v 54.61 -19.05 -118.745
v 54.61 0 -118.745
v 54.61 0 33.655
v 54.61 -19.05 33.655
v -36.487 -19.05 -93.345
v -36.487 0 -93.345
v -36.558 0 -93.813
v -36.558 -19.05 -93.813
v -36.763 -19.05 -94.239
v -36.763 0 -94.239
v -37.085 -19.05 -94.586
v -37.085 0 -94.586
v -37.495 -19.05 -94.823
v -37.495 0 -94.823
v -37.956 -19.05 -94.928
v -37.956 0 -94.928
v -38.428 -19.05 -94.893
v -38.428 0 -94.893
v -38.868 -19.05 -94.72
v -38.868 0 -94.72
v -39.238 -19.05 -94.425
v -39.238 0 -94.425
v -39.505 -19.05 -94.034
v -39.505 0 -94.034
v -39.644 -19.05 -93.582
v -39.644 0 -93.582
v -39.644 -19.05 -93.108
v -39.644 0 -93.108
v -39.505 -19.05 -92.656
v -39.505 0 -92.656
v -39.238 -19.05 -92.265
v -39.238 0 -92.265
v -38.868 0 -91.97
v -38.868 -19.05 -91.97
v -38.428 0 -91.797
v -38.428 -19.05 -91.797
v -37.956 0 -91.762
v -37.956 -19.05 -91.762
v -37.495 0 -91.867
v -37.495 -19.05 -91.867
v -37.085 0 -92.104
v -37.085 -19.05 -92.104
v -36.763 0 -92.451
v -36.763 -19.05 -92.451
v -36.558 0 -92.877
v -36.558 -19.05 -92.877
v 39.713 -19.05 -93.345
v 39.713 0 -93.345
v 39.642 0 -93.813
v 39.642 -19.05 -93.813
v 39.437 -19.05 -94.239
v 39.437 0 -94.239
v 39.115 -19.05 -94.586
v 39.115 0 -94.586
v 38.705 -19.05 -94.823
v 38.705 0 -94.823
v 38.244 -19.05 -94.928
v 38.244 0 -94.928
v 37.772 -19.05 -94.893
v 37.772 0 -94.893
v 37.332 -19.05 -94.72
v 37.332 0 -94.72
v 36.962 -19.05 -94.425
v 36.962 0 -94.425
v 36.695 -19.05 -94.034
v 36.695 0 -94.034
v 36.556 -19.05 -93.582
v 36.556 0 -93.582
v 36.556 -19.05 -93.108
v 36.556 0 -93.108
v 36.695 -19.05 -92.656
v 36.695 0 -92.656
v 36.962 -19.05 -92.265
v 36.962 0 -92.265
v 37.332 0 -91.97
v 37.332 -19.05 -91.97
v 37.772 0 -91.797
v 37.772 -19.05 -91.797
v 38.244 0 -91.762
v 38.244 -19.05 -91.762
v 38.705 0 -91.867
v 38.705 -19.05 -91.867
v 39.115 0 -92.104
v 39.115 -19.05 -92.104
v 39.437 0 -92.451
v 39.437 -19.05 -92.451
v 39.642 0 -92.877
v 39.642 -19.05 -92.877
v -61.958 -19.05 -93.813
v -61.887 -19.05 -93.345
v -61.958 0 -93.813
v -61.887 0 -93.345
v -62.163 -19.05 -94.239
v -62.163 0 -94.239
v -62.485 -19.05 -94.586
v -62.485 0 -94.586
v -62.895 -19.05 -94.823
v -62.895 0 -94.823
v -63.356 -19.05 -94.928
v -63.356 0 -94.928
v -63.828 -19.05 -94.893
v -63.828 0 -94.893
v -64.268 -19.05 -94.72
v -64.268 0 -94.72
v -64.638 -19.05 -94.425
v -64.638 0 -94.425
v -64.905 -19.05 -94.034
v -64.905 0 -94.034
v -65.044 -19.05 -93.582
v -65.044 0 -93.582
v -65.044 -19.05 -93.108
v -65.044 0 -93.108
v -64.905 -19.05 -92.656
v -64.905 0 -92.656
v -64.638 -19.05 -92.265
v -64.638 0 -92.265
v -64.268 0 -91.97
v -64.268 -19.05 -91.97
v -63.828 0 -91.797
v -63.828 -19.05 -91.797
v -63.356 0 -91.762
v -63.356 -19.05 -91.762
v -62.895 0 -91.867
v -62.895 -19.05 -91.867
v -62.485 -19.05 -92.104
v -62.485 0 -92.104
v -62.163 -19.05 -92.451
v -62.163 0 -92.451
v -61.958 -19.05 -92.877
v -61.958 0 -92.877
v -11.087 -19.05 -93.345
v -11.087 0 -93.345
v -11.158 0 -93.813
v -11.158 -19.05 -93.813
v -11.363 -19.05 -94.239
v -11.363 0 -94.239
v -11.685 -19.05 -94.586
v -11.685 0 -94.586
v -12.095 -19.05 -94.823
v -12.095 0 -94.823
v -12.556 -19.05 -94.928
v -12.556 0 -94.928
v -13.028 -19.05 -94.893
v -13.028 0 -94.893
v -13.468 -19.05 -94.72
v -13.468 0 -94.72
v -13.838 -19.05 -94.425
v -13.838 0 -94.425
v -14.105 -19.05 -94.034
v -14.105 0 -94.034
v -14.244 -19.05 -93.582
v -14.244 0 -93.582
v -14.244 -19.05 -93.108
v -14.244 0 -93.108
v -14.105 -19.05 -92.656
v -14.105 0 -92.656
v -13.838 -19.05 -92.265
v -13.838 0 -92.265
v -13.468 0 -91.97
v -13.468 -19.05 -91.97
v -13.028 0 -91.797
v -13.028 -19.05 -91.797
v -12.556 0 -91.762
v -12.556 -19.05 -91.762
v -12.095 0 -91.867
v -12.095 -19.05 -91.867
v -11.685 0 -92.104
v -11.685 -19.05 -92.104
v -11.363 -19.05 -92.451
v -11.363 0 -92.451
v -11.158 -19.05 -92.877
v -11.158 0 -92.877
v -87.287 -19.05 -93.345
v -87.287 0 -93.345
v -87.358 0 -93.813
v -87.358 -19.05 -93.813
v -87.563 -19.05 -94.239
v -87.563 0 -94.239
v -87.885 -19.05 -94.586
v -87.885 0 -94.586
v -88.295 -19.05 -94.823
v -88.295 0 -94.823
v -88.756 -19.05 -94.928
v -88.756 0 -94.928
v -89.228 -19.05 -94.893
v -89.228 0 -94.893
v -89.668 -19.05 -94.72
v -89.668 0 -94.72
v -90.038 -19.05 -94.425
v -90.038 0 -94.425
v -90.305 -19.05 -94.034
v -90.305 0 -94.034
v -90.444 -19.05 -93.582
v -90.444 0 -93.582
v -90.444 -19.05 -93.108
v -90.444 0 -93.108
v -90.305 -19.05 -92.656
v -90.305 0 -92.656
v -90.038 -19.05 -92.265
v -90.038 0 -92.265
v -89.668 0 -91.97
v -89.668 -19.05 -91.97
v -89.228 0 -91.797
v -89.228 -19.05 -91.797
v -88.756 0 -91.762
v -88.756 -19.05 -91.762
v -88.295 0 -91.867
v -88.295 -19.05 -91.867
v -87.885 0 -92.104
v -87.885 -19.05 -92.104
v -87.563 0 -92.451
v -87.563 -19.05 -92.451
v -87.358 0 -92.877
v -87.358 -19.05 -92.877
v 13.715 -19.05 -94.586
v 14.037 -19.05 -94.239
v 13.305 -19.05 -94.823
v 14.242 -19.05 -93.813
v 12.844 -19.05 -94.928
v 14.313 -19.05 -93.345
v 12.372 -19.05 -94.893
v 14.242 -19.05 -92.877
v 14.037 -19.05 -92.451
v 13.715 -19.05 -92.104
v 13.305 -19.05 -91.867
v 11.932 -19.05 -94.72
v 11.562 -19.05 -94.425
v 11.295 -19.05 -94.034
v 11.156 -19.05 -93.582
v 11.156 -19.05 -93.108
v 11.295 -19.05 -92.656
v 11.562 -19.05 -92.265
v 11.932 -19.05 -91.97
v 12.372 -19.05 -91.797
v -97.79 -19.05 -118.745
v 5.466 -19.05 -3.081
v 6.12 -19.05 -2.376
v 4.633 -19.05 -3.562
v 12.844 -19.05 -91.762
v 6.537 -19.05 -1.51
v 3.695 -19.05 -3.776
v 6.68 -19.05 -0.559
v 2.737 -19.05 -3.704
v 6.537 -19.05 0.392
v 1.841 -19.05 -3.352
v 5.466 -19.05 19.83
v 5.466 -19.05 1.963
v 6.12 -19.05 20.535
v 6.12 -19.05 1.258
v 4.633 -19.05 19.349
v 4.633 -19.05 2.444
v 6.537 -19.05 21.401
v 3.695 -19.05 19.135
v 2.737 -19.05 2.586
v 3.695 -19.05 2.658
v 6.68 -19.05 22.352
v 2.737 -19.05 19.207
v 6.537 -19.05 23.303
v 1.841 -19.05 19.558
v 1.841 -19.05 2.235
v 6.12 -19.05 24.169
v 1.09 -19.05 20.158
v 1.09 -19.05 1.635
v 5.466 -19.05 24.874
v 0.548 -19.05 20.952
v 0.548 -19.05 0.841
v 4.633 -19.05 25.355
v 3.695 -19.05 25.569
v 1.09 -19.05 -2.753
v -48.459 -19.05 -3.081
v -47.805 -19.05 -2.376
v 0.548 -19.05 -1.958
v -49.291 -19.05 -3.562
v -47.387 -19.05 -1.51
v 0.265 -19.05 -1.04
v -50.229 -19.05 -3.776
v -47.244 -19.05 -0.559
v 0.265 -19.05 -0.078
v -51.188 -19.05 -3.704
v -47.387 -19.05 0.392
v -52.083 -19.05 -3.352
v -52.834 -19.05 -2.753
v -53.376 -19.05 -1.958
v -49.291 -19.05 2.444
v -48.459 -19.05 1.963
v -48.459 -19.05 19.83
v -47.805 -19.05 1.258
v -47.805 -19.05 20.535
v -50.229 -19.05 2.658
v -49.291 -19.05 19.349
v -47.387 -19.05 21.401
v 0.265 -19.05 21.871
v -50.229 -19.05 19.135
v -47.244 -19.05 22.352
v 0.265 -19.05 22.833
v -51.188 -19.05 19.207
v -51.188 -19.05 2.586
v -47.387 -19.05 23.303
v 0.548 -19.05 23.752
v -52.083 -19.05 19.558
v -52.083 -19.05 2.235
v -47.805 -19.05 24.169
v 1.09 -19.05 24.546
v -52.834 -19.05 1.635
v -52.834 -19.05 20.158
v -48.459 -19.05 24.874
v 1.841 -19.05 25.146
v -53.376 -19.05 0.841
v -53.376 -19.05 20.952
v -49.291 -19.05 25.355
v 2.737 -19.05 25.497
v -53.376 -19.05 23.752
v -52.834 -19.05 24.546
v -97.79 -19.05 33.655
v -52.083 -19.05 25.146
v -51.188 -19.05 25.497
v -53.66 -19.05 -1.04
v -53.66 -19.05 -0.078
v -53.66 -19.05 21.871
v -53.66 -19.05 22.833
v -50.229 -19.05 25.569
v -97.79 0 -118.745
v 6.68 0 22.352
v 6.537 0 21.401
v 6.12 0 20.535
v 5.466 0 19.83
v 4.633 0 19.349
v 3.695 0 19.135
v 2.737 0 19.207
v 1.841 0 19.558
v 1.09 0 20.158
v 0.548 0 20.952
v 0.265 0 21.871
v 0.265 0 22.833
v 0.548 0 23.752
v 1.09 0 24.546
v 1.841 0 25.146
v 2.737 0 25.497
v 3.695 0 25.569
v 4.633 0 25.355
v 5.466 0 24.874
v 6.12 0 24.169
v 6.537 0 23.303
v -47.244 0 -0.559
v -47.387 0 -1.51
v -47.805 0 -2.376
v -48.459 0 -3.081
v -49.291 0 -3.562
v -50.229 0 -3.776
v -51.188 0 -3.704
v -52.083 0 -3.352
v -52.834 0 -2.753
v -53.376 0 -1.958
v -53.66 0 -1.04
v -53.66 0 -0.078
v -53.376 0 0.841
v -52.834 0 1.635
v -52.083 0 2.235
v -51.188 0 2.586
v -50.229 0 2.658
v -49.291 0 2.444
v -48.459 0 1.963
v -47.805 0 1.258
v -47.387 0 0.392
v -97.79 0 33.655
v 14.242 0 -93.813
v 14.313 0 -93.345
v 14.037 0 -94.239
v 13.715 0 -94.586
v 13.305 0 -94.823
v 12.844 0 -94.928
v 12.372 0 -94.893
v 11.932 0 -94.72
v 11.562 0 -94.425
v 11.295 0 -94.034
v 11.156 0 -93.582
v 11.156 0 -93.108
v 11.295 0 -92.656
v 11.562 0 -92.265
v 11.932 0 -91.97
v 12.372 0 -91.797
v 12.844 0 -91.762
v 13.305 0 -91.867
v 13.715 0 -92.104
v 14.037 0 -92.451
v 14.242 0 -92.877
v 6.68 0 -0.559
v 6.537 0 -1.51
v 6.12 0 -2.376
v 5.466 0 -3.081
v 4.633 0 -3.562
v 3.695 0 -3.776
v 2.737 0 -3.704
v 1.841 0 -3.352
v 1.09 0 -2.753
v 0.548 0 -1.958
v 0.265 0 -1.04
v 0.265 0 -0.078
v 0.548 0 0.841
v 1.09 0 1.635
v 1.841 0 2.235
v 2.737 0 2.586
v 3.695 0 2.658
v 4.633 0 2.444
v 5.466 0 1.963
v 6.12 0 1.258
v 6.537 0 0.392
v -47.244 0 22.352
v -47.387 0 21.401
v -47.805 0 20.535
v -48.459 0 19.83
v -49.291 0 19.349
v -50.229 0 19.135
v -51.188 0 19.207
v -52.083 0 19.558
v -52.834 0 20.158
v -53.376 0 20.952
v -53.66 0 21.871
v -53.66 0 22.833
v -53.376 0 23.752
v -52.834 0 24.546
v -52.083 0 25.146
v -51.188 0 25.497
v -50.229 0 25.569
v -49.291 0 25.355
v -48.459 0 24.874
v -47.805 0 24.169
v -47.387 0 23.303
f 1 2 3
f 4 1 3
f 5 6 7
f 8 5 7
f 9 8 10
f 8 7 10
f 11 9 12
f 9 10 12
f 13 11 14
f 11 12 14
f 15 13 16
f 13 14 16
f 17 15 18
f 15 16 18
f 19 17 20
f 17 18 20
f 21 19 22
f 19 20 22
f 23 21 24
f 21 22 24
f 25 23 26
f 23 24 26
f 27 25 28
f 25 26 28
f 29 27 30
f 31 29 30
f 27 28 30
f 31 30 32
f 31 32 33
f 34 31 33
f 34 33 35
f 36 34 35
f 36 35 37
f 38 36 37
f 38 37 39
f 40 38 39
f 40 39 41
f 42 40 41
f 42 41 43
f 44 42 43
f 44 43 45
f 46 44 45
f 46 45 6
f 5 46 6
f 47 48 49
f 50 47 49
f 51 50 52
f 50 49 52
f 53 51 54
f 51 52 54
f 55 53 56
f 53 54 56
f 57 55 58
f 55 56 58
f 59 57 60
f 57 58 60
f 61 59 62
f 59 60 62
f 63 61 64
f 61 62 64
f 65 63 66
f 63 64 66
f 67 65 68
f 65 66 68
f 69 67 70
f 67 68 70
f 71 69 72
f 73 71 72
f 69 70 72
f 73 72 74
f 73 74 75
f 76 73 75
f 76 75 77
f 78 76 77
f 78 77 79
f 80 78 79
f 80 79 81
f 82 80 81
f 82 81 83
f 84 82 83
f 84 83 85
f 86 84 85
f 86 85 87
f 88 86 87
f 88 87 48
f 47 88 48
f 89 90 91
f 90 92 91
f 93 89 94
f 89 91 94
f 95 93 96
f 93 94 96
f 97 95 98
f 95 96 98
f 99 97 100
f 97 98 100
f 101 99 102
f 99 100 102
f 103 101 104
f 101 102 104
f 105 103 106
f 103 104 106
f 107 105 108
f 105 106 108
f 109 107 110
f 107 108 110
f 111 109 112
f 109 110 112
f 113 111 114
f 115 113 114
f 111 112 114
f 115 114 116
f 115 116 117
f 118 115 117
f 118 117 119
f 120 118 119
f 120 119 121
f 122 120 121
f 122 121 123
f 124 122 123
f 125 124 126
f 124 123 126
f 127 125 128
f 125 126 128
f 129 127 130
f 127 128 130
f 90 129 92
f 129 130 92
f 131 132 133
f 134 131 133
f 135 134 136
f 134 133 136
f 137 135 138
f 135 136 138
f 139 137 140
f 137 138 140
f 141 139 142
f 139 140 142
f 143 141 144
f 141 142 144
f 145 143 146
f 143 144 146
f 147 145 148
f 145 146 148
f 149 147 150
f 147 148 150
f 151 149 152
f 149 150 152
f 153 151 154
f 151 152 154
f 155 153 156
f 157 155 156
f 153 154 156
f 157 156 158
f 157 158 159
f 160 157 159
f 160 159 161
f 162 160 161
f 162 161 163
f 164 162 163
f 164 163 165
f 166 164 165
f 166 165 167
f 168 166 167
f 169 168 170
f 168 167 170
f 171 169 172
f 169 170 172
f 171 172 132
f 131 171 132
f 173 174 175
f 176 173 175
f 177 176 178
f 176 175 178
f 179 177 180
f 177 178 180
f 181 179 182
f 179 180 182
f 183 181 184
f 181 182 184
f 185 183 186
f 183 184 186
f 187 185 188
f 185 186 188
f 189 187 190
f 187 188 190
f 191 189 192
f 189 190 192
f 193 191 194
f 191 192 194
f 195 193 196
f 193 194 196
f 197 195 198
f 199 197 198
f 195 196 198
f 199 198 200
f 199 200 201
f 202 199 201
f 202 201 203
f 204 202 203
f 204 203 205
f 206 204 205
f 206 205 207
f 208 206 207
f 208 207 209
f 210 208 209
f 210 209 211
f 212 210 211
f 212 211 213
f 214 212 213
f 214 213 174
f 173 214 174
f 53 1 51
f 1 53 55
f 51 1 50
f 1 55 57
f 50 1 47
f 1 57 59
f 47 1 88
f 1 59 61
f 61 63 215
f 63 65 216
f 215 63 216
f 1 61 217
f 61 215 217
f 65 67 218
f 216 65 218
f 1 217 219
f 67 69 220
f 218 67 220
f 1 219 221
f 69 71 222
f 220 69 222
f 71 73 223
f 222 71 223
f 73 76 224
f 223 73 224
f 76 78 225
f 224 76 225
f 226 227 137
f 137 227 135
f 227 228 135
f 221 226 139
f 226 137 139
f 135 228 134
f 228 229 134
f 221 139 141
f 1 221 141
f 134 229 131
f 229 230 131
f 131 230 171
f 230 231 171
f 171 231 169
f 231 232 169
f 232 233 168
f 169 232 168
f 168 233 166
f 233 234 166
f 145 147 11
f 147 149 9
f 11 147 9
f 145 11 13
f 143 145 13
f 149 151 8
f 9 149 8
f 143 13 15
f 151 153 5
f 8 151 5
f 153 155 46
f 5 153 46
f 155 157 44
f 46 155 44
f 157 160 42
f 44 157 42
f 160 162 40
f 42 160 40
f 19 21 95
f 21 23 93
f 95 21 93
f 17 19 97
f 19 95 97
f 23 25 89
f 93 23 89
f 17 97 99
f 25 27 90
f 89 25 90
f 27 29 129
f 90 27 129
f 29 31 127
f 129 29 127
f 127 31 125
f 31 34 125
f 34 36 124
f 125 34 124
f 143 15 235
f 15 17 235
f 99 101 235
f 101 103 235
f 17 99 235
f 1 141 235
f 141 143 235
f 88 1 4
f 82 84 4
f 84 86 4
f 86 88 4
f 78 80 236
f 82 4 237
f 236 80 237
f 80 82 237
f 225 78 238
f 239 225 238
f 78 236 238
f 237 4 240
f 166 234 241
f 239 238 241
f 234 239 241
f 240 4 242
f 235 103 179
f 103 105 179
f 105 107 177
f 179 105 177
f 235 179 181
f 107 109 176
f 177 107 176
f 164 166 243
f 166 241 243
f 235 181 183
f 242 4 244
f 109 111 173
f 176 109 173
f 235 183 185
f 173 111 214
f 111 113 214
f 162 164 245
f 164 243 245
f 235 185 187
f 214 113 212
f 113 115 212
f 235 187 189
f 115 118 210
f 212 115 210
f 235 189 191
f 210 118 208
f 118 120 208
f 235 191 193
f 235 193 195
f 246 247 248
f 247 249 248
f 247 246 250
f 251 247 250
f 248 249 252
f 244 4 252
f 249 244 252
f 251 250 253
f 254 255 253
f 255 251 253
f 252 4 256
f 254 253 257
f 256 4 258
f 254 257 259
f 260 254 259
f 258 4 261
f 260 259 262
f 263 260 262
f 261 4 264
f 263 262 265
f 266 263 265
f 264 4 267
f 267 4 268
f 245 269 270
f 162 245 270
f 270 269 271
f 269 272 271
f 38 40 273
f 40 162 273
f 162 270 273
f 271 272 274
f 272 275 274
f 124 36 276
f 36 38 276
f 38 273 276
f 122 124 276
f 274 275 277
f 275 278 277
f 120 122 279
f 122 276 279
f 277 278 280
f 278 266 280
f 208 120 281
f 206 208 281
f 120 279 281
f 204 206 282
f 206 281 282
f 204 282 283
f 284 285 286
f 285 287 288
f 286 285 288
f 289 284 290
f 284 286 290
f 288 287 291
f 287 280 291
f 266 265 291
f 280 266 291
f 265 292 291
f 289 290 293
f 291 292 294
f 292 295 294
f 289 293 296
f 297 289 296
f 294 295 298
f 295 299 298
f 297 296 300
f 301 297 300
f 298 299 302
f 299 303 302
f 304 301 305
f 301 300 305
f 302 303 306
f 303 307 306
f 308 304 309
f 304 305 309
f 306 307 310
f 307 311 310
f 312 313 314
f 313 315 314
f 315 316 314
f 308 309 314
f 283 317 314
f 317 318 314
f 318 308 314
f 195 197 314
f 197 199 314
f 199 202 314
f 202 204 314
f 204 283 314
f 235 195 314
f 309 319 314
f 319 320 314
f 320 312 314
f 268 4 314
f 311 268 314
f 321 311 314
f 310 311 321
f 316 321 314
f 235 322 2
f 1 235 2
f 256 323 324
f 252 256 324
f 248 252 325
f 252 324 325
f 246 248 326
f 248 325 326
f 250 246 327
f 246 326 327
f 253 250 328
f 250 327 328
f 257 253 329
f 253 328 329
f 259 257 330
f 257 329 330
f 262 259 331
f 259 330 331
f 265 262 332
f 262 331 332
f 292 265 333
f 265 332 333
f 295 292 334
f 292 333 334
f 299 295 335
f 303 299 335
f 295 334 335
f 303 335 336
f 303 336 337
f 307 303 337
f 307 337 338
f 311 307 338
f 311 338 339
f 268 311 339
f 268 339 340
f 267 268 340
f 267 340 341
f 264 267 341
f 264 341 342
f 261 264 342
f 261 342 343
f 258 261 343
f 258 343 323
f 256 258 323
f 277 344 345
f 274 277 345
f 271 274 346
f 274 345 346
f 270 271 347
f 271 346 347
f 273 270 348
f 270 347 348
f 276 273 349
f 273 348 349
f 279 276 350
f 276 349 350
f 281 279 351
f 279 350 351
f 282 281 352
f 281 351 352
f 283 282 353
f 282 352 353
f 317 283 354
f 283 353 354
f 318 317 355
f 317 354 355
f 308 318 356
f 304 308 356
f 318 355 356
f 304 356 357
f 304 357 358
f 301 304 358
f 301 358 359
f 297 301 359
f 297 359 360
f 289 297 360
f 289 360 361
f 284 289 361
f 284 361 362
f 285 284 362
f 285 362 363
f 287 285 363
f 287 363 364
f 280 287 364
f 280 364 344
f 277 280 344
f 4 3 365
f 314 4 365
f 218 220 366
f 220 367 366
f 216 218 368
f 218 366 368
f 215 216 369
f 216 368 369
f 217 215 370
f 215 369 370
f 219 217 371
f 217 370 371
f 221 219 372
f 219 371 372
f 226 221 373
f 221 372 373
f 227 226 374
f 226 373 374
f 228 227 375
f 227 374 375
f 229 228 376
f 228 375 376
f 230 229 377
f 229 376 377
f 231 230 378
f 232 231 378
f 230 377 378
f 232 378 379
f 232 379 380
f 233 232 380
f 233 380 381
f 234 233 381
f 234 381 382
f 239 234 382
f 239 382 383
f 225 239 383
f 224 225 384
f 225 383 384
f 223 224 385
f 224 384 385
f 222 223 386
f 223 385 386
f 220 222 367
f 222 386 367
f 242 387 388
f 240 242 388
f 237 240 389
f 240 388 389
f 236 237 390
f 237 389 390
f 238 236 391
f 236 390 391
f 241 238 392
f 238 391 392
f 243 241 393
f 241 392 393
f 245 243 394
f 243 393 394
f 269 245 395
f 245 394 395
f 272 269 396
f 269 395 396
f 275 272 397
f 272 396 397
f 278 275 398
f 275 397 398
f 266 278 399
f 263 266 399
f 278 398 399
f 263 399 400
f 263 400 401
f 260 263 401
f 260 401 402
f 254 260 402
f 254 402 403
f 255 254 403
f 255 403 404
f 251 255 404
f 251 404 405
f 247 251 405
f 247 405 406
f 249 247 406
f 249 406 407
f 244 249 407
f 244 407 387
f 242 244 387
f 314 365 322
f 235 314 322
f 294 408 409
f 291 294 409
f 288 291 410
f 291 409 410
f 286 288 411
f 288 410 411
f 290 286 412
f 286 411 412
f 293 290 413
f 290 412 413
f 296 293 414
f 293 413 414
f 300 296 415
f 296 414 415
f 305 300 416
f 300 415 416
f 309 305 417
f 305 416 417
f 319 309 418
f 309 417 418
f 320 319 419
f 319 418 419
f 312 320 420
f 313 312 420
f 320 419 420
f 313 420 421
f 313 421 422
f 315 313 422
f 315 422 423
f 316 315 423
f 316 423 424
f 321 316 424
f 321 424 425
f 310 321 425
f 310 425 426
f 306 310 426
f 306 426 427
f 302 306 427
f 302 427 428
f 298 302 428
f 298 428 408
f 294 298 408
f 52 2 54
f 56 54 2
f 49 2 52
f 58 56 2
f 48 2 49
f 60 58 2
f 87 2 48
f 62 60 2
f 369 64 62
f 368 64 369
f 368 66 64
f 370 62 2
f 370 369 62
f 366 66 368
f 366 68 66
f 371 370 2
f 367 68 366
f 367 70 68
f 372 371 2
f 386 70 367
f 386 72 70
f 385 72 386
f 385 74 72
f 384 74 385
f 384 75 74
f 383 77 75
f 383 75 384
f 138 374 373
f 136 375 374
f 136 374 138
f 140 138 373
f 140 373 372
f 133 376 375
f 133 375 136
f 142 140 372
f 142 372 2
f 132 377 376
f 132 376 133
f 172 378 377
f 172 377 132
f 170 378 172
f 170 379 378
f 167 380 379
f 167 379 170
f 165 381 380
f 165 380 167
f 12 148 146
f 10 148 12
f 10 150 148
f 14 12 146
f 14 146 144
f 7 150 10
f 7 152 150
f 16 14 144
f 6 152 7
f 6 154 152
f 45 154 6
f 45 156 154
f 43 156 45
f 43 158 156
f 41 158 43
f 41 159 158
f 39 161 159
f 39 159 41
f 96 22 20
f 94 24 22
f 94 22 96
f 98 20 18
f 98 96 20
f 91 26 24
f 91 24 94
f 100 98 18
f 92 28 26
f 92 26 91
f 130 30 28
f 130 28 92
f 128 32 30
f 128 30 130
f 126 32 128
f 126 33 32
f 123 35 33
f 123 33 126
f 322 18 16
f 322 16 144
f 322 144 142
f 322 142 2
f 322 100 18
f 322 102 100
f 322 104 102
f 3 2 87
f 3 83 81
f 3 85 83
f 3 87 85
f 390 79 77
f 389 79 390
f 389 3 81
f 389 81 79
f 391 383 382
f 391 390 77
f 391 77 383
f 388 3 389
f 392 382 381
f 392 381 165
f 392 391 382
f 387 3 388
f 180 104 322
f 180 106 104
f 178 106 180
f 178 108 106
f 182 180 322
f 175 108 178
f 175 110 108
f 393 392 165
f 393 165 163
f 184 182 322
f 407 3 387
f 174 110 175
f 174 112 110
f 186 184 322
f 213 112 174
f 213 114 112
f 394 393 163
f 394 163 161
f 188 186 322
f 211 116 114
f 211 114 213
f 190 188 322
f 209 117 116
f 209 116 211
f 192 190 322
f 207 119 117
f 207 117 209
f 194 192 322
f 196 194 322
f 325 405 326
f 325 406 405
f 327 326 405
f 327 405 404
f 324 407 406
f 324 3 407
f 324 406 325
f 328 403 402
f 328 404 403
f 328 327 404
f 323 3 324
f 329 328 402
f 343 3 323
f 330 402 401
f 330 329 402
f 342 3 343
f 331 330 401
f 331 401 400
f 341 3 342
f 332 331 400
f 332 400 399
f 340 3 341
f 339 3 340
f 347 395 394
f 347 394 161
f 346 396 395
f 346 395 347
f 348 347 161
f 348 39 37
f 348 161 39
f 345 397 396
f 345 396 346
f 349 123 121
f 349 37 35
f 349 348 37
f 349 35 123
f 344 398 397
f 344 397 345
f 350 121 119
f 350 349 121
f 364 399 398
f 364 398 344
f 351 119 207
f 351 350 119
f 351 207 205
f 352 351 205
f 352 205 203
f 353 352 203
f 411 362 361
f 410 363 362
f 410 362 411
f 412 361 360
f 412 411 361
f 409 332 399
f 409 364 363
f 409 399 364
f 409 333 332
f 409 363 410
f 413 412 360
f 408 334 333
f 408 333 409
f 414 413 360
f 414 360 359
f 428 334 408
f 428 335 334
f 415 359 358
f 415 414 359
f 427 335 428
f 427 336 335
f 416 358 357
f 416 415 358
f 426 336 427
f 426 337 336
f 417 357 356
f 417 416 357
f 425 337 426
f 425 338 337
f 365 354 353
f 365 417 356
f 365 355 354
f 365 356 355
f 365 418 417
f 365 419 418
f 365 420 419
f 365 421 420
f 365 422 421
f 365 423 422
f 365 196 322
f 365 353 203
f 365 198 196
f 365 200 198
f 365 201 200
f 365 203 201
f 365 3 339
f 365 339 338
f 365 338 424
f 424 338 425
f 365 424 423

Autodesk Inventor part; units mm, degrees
ref_plane "YZ Plane" through (0, 0, 0) normal (1, 0, 0) x (0, 1, 0)
ref_plane "XZ Plane" through (0, 0, 0) normal (0, 1, 0) x (-1, 0, 0)
ref_plane "XY Plane" through (0, 0, 0) normal (0, 0, 1) x (1, 0, 0)
sketch "Sketch1" plane through (0, 0, 0) normal (0, 1, 0) x (-1, 0, 0)
  line L0 (97.79, -118.745) -> (-54.61, -118.745)
  line L1 (-54.61, -118.745) -> (-54.61, 33.655)
  line L2 (-54.61, 33.655) -> (97.79, 33.655)
  line L3 (97.79, 33.655) -> (97.79, -118.745)
  point P0 (0, 0)
  dimension "d0" = 152.4
  dimension "d1" = 152.4
extrude "Extrusion1" add sketch "Sketch1" against normal blind 19.05
sketch "Sketch2" plane through (0, 0, 0) normal (0, 1, 0) x (1, 0, 0)
  circle A0 centre (-88.8746, 93.345) radius 1.5875
  line L0 (-97.79, 118.745) -> (54.61, 118.745) projected
  line L1 (-97.79, -33.655) -> (-97.79, 118.745) projected
  point P0 (0, 0)
  dimension "d4" = 25.4
  dimension "d5" = 3.175
  dimension "d6" = 8.9154
extrude "Extrusion2" cut sketch "Sketch2" against normal blind 19.05
pattern_linear "Rectangular Pattern1" count 6 spacing 25.4 along (1, 0, 0) of "Extrusion2"
sketch "Sketch3" plane through (0, 0, 0) normal (0, 1, 0) x (1, 0, 0)
  circle A0 centre (3.4544, -22.352) radius 3.2258
  line L0 (54.61, -33.655) -> (-97.79, -33.655) projected
  line L1 (54.61, 118.745) -> (54.61, -33.655) projected
  circle A1 centre (-50.4698, -22.352) radius 3.2258
  circle A2 centre (3.4544, 0.5588) radius 3.2258
  circle A3 centre (-50.4698, 0.5588) radius 3.2258
  point P0 (0, 0)
  dimension "d12" = 11.303
  dimension "d13" = 51.1556
  dimension "d14" = 6.4516
  dimension "d15" = 53.9242
  dimension "d16" = 22.9108
  dimension "d17" = 6.4516
extrude "Extrusion3" cut sketch "Sketch3" against normal blind 25.4
equation "\"d17\" = d14"
properties part number "base of car 2"
